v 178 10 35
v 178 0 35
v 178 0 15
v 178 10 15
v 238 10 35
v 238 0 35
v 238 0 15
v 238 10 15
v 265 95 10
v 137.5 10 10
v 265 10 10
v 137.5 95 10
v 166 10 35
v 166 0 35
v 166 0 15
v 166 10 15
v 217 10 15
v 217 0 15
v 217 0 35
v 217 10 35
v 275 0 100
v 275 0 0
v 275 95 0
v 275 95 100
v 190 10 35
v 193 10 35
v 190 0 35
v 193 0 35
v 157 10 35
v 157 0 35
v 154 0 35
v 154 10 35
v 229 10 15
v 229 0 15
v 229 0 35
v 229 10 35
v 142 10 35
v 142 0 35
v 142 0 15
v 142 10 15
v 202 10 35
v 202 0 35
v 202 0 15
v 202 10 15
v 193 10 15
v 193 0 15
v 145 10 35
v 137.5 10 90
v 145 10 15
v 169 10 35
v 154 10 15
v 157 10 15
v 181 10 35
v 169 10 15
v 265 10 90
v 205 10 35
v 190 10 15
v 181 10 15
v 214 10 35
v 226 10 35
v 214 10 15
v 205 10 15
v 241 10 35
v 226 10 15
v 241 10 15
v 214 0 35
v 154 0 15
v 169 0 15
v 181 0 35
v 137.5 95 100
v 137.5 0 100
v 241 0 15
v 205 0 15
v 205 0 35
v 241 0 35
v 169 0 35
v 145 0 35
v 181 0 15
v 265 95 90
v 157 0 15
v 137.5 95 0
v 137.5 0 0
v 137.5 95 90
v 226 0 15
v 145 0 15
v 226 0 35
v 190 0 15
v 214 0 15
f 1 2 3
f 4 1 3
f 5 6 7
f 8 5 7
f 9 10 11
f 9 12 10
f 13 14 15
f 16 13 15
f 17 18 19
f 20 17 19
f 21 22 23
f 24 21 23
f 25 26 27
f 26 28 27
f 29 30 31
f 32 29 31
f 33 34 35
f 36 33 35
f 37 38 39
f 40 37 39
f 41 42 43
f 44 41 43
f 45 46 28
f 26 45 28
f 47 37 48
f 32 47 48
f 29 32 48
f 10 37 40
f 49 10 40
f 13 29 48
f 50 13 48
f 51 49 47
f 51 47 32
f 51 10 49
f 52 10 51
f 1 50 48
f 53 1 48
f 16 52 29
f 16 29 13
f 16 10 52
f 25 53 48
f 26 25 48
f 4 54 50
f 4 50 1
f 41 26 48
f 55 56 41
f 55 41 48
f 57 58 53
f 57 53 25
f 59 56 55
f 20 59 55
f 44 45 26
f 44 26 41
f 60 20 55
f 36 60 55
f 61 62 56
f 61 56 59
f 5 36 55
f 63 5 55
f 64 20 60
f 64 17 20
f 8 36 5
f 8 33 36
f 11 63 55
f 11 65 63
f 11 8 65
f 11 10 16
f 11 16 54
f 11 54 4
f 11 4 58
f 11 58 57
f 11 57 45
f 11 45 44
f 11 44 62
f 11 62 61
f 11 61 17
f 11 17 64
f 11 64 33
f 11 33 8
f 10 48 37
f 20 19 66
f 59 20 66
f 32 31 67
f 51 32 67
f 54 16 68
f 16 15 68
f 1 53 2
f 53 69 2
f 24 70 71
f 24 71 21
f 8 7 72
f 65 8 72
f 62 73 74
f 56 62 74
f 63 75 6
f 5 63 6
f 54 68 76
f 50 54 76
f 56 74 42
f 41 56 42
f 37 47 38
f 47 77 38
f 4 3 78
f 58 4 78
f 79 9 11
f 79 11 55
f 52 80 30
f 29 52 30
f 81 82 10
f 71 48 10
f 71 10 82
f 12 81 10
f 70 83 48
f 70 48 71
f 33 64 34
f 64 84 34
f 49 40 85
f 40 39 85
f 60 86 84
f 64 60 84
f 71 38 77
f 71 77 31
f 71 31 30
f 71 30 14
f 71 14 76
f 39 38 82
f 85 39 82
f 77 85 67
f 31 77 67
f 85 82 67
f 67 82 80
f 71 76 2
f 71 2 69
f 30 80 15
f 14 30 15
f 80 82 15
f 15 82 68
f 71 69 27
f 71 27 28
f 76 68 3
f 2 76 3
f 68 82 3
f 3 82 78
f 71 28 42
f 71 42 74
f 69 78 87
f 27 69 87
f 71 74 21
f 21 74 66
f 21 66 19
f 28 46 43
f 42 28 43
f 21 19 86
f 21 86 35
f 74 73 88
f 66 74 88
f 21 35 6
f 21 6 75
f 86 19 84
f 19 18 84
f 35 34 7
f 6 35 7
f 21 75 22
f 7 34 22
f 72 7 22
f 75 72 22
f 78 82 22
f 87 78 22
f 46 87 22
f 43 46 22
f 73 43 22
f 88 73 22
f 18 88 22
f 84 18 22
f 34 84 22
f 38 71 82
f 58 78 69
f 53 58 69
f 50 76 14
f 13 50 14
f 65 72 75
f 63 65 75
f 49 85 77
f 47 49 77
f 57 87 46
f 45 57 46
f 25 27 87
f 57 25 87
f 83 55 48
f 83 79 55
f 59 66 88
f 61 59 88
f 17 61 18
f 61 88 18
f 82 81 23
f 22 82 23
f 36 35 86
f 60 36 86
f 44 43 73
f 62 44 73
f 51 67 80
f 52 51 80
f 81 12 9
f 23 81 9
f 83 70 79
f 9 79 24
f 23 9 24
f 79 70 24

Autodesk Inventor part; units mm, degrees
ref_plane "YZ Plane" through (0, 0, 0) normal (1, 0, 0) x (0, 1, 0)
ref_plane "XZ Plane" through (0, 0, 0) normal (0, 1, 0) x (-1, 0, 0)
ref_plane "XY Plane" through (0, 0, 0) normal (0, 0, 1) x (1, 0, 0)
sketch "Sketch1" plane through (0, 0, 0) normal (0, 0, 1) x (1, 0, 0)
  line L0 (0, 0) -> (275, 0)
  line L1 (275, 0) -> (275, 200)
  line L2 (275, 200) -> (0, 200)
  line L3 (0, 200) -> (0, 0)
  dimension "d0" = 275
  dimension "d1" = 200
extrude "Extrusion1" add sketch "Sketch1" along normal blind 20
sketch "Sketch3" plane through (0, 0, 20) normal (0, 0, 1) x (1, 0, 0)
  line L0 (275, 0) -> (275, 200) projected
  line L1 (0, 200) -> (275, 200)
  line L2 (275, 200) -> (275, 0)
  line L3 (275, 0) -> (0, 0)
  line L4 (0, 0) -> (0, 200)
  point P0 (0, 0)
extrude "Extrusion3" add sketch "Sketch3" along normal blind 80
sketch "Sketch4" plane through (0, 0, 0) normal (0, -1, 0) x (1, 0, 0)
  circle A0 centre (47.5, 50) radius 17.5
  circle A1 centre (227.5, 50) radius 17.5
  line L0 (47.5, 50) -> (227.5, 50) construction
  line L1 (0, 0) -> (0, 100) projected
  line L2 (0, 100) -> (275, 100) projected
  point P0 (0, 50)
  point P1 (137.5, 50)
  point P2 (137.5, 100)
  dimension "d10" = 35
  dimension "d11" = 35
  dimension "d12" = 180
extrude "Extrusion4" cut sketch "Sketch4" against normal blind 100 contours A0
sketch "Sketch5" plane through (0, 200, 0) normal (0, 1, 0) x (1, 0, 0)
  line L0 (275, 0) -> (0, 0) projected
  line L1 (0, 0) -> (0, -100) projected
  line L2 (275, -100) -> (0, -100) projected
  line L3 (275, 0) -> (275, -100) projected
  line L4 (265, -90) -> (10, -90)
  line L5 (10, -90) -> (10, -10)
  line L6 (10, -10) -> (265, -10)
  line L7 (265, -10) -> (265, -90)
  point P0 (0, 0)
  dimension "d15" = 10
extrude "Extrusion5" cut sketch "Sketch5" against normal blind 190 contours L4 L5 L6 L7
sketch "Sketch6" plane through (0, 0, 0) normal (-1, 0, 0) x (0, 0, 1)
  line L0 (0, 200) -> (100, 200) projected
  line L1 (0, 200) -> (0, 0) projected
  line L2 (100, 200) -> (0, 200)
  line L3 (0, 200) -> (0, 190)
  line L4 (0, 190) -> (100, 190)
  line L5 (100, 190) -> (100, 200)
  dimension "d18" = 10
extrude "Extrusion6" cut sketch "Sketch6" against normal through all
sketch "Sketch7" plane through (0, 190, 100) normal (0, 1, 0) x (1, 0, 0)
  line L0 (275, 100) -> (275, 0) construction
  line L1 (0, 100) -> (275, 100) construction
  line L2 (0, 0) -> (0, 100) construction
  line L3 (275, 0) -> (0, 0) construction
  line L4 (265, 10) -> (265, 90) construction
  line L5 (10, 10) -> (265, 10) construction
  line L6 (10, 90) -> (10, 10) construction
  line L7 (265, 90) -> (10, 90) construction
  line L8 (270, 5) -> (270, 95) construction
  line L9 (270, 95) -> (5, 95) construction
  line L10 (5, 95) -> (5, 5) construction
  line L11 (5, 5) -> (270, 5) construction
  circle A0 centre (270, 5) radius 2.5
  circle A1 centre (270, 95) radius 2.5
  circle A2 centre (5, 95) radius 2.5
  circle A3 centre (5, 5) radius 2.5
  point P0 (0, 100)
  dimension "d21" = 5
  dimension "d22" = 5
  dimension "d23" = 5
  dimension "d24" = 5
  dimension "d25" = 5
extrude "Extrusion7" cut sketch "Sketch7" against normal blind 25
sketch "Sketch8" plane through (0, 0, 0) normal (0, -1, 0) x (1, 0, 0)
  line L0 (82, 15) -> (85, 15)
  line L1 (85, 15) -> (85, 35)
  line L2 (85, 35) -> (82, 35)
  line L3 (82, 35) -> (82, 15)
  line L4 (0, 0) -> (0, 100) projected
  line L5 (0, 0) -> (275, 0) projected
  line L6 (97, 15) -> (97, 35)
  line L7 (97, 35) -> (94, 35)
  line L8 (94, 35) -> (94, 15)
  line L9 (94, 15) -> (97, 15)
  line L10 (109, 15) -> (109, 35)
  line L11 (109, 35) -> (106, 35)
  line L12 (106, 35) -> (106, 15)
  line L13 (106, 15) -> (109, 15)
  line L14 (121, 15) -> (121, 35)
  line L15 (121, 35) -> (118, 35)
  line L16 (118, 35) -> (118, 15)
  line L17 (118, 15) -> (121, 15)
  line L18 (133, 15) -> (133, 35)
  line L19 (133, 35) -> (130, 35)
  line L20 (130, 35) -> (130, 15)
  line L21 (130, 15) -> (133, 15)
  line L22 (145, 15) -> (145, 35)
  line L23 (145, 35) -> (142, 35)
  line L24 (142, 35) -> (142, 15)
  line L25 (142, 15) -> (145, 15)
  line L26 (157, 15) -> (157, 35)
  line L27 (157, 35) -> (154, 35)
  line L28 (154, 35) -> (154, 15)
  line L29 (154, 15) -> (157, 15)
  line L30 (169, 15) -> (169, 35)
  line L31 (169, 35) -> (166, 35)
  line L32 (166, 35) -> (166, 15)
  line L33 (166, 15) -> (169, 15)
  line L34 (181, 15) -> (181, 35)
  line L35 (181, 35) -> (178, 35)
  line L36 (178, 35) -> (178, 15)
  line L37 (178, 15) -> (181, 15)
  line L38 (193, 15) -> (193, 35)
  line L39 (193, 35) -> (190, 35)
  line L40 (190, 35) -> (190, 15)
  line L41 (190, 15) -> (193, 15)
  line L42 (205, 15) -> (205, 35)
  line L43 (205, 35) -> (202, 35)
  line L44 (202, 35) -> (202, 15)
  line L45 (202, 15) -> (205, 15)
  line L46 (217, 15) -> (217, 35)
  line L47 (217, 35) -> (214, 35)
  line L48 (214, 35) -> (214, 15)
  line L49 (214, 15) -> (217, 15)
  line L50 (229, 15) -> (229, 35)
  line L51 (229, 35) -> (226, 35)
  line L52 (226, 35) -> (226, 15)
  line L53 (226, 15) -> (229, 15)
  line L54 (241, 15) -> (241, 35)
  line L55 (241, 35) -> (238, 35)
  line L56 (238, 35) -> (238, 15)
  line L57 (238, 15) -> (241, 15)
  dimension "d28" = 3
  dimension "d29" = 20
  dimension "d30" = 82
  dimension "d31" = 15
  dimension "d34" = 12
extrude "Extrusion8" cut sketch "Sketch8" against normal through all
sketch "Sketch2" plane through (275, 0, 100) normal (1, 0, 0) x (0, 0, -1)
  circle A0 centre (70, 125) radius 3
  line L0 (100, 0) -> (0, 0) projected
  line L1 (100, 0) -> (100, 190) projected
  dimension "d4" = 6
  dimension "d45" = 125
  dimension "d46" = 30
extrude "Extrusion2" cut sketch "Sketch2" against normal through all
sketch "Sketch10" plane through (0, 190, 100) normal (0, 1, 0) x (1, 0, 0)
  line L0 (0, 100) -> (275, 100) projected
  line L1 (275, 0) -> (0, 0) projected
  line L2 (0, 100) -> (137.5, 100)
  line L3 (137.5, 100) -> (137.5, 0)
  line L4 (137.5, 0) -> (0, 0)
  line L5 (0, 0) -> (0, 100)
extrude "Extrusion10" cut sketch "Sketch10" against normal through all
sketch "Sketch12" plane through (0, 0, 100) normal (0, 0, 1) x (1, 0, 0)
  line L0 (275, 0) -> (275, 190) projected
  line L1 (137.5, 190) -> (137.5, 0) projected
  line L2 (275, 190) -> (137.5, 190)
  line L3 (137.5, 190) -> (137.5, 95)
  line L4 (137.5, 95) -> (275, 95)
  line L5 (275, 95) -> (275, 190)
  point P0 (0, 0)
  dimension "d49" = 95
extrude "Extrusion11" cut sketch "Sketch12" against normal through all
properties part number "HA005" material "ABS Plastic"
